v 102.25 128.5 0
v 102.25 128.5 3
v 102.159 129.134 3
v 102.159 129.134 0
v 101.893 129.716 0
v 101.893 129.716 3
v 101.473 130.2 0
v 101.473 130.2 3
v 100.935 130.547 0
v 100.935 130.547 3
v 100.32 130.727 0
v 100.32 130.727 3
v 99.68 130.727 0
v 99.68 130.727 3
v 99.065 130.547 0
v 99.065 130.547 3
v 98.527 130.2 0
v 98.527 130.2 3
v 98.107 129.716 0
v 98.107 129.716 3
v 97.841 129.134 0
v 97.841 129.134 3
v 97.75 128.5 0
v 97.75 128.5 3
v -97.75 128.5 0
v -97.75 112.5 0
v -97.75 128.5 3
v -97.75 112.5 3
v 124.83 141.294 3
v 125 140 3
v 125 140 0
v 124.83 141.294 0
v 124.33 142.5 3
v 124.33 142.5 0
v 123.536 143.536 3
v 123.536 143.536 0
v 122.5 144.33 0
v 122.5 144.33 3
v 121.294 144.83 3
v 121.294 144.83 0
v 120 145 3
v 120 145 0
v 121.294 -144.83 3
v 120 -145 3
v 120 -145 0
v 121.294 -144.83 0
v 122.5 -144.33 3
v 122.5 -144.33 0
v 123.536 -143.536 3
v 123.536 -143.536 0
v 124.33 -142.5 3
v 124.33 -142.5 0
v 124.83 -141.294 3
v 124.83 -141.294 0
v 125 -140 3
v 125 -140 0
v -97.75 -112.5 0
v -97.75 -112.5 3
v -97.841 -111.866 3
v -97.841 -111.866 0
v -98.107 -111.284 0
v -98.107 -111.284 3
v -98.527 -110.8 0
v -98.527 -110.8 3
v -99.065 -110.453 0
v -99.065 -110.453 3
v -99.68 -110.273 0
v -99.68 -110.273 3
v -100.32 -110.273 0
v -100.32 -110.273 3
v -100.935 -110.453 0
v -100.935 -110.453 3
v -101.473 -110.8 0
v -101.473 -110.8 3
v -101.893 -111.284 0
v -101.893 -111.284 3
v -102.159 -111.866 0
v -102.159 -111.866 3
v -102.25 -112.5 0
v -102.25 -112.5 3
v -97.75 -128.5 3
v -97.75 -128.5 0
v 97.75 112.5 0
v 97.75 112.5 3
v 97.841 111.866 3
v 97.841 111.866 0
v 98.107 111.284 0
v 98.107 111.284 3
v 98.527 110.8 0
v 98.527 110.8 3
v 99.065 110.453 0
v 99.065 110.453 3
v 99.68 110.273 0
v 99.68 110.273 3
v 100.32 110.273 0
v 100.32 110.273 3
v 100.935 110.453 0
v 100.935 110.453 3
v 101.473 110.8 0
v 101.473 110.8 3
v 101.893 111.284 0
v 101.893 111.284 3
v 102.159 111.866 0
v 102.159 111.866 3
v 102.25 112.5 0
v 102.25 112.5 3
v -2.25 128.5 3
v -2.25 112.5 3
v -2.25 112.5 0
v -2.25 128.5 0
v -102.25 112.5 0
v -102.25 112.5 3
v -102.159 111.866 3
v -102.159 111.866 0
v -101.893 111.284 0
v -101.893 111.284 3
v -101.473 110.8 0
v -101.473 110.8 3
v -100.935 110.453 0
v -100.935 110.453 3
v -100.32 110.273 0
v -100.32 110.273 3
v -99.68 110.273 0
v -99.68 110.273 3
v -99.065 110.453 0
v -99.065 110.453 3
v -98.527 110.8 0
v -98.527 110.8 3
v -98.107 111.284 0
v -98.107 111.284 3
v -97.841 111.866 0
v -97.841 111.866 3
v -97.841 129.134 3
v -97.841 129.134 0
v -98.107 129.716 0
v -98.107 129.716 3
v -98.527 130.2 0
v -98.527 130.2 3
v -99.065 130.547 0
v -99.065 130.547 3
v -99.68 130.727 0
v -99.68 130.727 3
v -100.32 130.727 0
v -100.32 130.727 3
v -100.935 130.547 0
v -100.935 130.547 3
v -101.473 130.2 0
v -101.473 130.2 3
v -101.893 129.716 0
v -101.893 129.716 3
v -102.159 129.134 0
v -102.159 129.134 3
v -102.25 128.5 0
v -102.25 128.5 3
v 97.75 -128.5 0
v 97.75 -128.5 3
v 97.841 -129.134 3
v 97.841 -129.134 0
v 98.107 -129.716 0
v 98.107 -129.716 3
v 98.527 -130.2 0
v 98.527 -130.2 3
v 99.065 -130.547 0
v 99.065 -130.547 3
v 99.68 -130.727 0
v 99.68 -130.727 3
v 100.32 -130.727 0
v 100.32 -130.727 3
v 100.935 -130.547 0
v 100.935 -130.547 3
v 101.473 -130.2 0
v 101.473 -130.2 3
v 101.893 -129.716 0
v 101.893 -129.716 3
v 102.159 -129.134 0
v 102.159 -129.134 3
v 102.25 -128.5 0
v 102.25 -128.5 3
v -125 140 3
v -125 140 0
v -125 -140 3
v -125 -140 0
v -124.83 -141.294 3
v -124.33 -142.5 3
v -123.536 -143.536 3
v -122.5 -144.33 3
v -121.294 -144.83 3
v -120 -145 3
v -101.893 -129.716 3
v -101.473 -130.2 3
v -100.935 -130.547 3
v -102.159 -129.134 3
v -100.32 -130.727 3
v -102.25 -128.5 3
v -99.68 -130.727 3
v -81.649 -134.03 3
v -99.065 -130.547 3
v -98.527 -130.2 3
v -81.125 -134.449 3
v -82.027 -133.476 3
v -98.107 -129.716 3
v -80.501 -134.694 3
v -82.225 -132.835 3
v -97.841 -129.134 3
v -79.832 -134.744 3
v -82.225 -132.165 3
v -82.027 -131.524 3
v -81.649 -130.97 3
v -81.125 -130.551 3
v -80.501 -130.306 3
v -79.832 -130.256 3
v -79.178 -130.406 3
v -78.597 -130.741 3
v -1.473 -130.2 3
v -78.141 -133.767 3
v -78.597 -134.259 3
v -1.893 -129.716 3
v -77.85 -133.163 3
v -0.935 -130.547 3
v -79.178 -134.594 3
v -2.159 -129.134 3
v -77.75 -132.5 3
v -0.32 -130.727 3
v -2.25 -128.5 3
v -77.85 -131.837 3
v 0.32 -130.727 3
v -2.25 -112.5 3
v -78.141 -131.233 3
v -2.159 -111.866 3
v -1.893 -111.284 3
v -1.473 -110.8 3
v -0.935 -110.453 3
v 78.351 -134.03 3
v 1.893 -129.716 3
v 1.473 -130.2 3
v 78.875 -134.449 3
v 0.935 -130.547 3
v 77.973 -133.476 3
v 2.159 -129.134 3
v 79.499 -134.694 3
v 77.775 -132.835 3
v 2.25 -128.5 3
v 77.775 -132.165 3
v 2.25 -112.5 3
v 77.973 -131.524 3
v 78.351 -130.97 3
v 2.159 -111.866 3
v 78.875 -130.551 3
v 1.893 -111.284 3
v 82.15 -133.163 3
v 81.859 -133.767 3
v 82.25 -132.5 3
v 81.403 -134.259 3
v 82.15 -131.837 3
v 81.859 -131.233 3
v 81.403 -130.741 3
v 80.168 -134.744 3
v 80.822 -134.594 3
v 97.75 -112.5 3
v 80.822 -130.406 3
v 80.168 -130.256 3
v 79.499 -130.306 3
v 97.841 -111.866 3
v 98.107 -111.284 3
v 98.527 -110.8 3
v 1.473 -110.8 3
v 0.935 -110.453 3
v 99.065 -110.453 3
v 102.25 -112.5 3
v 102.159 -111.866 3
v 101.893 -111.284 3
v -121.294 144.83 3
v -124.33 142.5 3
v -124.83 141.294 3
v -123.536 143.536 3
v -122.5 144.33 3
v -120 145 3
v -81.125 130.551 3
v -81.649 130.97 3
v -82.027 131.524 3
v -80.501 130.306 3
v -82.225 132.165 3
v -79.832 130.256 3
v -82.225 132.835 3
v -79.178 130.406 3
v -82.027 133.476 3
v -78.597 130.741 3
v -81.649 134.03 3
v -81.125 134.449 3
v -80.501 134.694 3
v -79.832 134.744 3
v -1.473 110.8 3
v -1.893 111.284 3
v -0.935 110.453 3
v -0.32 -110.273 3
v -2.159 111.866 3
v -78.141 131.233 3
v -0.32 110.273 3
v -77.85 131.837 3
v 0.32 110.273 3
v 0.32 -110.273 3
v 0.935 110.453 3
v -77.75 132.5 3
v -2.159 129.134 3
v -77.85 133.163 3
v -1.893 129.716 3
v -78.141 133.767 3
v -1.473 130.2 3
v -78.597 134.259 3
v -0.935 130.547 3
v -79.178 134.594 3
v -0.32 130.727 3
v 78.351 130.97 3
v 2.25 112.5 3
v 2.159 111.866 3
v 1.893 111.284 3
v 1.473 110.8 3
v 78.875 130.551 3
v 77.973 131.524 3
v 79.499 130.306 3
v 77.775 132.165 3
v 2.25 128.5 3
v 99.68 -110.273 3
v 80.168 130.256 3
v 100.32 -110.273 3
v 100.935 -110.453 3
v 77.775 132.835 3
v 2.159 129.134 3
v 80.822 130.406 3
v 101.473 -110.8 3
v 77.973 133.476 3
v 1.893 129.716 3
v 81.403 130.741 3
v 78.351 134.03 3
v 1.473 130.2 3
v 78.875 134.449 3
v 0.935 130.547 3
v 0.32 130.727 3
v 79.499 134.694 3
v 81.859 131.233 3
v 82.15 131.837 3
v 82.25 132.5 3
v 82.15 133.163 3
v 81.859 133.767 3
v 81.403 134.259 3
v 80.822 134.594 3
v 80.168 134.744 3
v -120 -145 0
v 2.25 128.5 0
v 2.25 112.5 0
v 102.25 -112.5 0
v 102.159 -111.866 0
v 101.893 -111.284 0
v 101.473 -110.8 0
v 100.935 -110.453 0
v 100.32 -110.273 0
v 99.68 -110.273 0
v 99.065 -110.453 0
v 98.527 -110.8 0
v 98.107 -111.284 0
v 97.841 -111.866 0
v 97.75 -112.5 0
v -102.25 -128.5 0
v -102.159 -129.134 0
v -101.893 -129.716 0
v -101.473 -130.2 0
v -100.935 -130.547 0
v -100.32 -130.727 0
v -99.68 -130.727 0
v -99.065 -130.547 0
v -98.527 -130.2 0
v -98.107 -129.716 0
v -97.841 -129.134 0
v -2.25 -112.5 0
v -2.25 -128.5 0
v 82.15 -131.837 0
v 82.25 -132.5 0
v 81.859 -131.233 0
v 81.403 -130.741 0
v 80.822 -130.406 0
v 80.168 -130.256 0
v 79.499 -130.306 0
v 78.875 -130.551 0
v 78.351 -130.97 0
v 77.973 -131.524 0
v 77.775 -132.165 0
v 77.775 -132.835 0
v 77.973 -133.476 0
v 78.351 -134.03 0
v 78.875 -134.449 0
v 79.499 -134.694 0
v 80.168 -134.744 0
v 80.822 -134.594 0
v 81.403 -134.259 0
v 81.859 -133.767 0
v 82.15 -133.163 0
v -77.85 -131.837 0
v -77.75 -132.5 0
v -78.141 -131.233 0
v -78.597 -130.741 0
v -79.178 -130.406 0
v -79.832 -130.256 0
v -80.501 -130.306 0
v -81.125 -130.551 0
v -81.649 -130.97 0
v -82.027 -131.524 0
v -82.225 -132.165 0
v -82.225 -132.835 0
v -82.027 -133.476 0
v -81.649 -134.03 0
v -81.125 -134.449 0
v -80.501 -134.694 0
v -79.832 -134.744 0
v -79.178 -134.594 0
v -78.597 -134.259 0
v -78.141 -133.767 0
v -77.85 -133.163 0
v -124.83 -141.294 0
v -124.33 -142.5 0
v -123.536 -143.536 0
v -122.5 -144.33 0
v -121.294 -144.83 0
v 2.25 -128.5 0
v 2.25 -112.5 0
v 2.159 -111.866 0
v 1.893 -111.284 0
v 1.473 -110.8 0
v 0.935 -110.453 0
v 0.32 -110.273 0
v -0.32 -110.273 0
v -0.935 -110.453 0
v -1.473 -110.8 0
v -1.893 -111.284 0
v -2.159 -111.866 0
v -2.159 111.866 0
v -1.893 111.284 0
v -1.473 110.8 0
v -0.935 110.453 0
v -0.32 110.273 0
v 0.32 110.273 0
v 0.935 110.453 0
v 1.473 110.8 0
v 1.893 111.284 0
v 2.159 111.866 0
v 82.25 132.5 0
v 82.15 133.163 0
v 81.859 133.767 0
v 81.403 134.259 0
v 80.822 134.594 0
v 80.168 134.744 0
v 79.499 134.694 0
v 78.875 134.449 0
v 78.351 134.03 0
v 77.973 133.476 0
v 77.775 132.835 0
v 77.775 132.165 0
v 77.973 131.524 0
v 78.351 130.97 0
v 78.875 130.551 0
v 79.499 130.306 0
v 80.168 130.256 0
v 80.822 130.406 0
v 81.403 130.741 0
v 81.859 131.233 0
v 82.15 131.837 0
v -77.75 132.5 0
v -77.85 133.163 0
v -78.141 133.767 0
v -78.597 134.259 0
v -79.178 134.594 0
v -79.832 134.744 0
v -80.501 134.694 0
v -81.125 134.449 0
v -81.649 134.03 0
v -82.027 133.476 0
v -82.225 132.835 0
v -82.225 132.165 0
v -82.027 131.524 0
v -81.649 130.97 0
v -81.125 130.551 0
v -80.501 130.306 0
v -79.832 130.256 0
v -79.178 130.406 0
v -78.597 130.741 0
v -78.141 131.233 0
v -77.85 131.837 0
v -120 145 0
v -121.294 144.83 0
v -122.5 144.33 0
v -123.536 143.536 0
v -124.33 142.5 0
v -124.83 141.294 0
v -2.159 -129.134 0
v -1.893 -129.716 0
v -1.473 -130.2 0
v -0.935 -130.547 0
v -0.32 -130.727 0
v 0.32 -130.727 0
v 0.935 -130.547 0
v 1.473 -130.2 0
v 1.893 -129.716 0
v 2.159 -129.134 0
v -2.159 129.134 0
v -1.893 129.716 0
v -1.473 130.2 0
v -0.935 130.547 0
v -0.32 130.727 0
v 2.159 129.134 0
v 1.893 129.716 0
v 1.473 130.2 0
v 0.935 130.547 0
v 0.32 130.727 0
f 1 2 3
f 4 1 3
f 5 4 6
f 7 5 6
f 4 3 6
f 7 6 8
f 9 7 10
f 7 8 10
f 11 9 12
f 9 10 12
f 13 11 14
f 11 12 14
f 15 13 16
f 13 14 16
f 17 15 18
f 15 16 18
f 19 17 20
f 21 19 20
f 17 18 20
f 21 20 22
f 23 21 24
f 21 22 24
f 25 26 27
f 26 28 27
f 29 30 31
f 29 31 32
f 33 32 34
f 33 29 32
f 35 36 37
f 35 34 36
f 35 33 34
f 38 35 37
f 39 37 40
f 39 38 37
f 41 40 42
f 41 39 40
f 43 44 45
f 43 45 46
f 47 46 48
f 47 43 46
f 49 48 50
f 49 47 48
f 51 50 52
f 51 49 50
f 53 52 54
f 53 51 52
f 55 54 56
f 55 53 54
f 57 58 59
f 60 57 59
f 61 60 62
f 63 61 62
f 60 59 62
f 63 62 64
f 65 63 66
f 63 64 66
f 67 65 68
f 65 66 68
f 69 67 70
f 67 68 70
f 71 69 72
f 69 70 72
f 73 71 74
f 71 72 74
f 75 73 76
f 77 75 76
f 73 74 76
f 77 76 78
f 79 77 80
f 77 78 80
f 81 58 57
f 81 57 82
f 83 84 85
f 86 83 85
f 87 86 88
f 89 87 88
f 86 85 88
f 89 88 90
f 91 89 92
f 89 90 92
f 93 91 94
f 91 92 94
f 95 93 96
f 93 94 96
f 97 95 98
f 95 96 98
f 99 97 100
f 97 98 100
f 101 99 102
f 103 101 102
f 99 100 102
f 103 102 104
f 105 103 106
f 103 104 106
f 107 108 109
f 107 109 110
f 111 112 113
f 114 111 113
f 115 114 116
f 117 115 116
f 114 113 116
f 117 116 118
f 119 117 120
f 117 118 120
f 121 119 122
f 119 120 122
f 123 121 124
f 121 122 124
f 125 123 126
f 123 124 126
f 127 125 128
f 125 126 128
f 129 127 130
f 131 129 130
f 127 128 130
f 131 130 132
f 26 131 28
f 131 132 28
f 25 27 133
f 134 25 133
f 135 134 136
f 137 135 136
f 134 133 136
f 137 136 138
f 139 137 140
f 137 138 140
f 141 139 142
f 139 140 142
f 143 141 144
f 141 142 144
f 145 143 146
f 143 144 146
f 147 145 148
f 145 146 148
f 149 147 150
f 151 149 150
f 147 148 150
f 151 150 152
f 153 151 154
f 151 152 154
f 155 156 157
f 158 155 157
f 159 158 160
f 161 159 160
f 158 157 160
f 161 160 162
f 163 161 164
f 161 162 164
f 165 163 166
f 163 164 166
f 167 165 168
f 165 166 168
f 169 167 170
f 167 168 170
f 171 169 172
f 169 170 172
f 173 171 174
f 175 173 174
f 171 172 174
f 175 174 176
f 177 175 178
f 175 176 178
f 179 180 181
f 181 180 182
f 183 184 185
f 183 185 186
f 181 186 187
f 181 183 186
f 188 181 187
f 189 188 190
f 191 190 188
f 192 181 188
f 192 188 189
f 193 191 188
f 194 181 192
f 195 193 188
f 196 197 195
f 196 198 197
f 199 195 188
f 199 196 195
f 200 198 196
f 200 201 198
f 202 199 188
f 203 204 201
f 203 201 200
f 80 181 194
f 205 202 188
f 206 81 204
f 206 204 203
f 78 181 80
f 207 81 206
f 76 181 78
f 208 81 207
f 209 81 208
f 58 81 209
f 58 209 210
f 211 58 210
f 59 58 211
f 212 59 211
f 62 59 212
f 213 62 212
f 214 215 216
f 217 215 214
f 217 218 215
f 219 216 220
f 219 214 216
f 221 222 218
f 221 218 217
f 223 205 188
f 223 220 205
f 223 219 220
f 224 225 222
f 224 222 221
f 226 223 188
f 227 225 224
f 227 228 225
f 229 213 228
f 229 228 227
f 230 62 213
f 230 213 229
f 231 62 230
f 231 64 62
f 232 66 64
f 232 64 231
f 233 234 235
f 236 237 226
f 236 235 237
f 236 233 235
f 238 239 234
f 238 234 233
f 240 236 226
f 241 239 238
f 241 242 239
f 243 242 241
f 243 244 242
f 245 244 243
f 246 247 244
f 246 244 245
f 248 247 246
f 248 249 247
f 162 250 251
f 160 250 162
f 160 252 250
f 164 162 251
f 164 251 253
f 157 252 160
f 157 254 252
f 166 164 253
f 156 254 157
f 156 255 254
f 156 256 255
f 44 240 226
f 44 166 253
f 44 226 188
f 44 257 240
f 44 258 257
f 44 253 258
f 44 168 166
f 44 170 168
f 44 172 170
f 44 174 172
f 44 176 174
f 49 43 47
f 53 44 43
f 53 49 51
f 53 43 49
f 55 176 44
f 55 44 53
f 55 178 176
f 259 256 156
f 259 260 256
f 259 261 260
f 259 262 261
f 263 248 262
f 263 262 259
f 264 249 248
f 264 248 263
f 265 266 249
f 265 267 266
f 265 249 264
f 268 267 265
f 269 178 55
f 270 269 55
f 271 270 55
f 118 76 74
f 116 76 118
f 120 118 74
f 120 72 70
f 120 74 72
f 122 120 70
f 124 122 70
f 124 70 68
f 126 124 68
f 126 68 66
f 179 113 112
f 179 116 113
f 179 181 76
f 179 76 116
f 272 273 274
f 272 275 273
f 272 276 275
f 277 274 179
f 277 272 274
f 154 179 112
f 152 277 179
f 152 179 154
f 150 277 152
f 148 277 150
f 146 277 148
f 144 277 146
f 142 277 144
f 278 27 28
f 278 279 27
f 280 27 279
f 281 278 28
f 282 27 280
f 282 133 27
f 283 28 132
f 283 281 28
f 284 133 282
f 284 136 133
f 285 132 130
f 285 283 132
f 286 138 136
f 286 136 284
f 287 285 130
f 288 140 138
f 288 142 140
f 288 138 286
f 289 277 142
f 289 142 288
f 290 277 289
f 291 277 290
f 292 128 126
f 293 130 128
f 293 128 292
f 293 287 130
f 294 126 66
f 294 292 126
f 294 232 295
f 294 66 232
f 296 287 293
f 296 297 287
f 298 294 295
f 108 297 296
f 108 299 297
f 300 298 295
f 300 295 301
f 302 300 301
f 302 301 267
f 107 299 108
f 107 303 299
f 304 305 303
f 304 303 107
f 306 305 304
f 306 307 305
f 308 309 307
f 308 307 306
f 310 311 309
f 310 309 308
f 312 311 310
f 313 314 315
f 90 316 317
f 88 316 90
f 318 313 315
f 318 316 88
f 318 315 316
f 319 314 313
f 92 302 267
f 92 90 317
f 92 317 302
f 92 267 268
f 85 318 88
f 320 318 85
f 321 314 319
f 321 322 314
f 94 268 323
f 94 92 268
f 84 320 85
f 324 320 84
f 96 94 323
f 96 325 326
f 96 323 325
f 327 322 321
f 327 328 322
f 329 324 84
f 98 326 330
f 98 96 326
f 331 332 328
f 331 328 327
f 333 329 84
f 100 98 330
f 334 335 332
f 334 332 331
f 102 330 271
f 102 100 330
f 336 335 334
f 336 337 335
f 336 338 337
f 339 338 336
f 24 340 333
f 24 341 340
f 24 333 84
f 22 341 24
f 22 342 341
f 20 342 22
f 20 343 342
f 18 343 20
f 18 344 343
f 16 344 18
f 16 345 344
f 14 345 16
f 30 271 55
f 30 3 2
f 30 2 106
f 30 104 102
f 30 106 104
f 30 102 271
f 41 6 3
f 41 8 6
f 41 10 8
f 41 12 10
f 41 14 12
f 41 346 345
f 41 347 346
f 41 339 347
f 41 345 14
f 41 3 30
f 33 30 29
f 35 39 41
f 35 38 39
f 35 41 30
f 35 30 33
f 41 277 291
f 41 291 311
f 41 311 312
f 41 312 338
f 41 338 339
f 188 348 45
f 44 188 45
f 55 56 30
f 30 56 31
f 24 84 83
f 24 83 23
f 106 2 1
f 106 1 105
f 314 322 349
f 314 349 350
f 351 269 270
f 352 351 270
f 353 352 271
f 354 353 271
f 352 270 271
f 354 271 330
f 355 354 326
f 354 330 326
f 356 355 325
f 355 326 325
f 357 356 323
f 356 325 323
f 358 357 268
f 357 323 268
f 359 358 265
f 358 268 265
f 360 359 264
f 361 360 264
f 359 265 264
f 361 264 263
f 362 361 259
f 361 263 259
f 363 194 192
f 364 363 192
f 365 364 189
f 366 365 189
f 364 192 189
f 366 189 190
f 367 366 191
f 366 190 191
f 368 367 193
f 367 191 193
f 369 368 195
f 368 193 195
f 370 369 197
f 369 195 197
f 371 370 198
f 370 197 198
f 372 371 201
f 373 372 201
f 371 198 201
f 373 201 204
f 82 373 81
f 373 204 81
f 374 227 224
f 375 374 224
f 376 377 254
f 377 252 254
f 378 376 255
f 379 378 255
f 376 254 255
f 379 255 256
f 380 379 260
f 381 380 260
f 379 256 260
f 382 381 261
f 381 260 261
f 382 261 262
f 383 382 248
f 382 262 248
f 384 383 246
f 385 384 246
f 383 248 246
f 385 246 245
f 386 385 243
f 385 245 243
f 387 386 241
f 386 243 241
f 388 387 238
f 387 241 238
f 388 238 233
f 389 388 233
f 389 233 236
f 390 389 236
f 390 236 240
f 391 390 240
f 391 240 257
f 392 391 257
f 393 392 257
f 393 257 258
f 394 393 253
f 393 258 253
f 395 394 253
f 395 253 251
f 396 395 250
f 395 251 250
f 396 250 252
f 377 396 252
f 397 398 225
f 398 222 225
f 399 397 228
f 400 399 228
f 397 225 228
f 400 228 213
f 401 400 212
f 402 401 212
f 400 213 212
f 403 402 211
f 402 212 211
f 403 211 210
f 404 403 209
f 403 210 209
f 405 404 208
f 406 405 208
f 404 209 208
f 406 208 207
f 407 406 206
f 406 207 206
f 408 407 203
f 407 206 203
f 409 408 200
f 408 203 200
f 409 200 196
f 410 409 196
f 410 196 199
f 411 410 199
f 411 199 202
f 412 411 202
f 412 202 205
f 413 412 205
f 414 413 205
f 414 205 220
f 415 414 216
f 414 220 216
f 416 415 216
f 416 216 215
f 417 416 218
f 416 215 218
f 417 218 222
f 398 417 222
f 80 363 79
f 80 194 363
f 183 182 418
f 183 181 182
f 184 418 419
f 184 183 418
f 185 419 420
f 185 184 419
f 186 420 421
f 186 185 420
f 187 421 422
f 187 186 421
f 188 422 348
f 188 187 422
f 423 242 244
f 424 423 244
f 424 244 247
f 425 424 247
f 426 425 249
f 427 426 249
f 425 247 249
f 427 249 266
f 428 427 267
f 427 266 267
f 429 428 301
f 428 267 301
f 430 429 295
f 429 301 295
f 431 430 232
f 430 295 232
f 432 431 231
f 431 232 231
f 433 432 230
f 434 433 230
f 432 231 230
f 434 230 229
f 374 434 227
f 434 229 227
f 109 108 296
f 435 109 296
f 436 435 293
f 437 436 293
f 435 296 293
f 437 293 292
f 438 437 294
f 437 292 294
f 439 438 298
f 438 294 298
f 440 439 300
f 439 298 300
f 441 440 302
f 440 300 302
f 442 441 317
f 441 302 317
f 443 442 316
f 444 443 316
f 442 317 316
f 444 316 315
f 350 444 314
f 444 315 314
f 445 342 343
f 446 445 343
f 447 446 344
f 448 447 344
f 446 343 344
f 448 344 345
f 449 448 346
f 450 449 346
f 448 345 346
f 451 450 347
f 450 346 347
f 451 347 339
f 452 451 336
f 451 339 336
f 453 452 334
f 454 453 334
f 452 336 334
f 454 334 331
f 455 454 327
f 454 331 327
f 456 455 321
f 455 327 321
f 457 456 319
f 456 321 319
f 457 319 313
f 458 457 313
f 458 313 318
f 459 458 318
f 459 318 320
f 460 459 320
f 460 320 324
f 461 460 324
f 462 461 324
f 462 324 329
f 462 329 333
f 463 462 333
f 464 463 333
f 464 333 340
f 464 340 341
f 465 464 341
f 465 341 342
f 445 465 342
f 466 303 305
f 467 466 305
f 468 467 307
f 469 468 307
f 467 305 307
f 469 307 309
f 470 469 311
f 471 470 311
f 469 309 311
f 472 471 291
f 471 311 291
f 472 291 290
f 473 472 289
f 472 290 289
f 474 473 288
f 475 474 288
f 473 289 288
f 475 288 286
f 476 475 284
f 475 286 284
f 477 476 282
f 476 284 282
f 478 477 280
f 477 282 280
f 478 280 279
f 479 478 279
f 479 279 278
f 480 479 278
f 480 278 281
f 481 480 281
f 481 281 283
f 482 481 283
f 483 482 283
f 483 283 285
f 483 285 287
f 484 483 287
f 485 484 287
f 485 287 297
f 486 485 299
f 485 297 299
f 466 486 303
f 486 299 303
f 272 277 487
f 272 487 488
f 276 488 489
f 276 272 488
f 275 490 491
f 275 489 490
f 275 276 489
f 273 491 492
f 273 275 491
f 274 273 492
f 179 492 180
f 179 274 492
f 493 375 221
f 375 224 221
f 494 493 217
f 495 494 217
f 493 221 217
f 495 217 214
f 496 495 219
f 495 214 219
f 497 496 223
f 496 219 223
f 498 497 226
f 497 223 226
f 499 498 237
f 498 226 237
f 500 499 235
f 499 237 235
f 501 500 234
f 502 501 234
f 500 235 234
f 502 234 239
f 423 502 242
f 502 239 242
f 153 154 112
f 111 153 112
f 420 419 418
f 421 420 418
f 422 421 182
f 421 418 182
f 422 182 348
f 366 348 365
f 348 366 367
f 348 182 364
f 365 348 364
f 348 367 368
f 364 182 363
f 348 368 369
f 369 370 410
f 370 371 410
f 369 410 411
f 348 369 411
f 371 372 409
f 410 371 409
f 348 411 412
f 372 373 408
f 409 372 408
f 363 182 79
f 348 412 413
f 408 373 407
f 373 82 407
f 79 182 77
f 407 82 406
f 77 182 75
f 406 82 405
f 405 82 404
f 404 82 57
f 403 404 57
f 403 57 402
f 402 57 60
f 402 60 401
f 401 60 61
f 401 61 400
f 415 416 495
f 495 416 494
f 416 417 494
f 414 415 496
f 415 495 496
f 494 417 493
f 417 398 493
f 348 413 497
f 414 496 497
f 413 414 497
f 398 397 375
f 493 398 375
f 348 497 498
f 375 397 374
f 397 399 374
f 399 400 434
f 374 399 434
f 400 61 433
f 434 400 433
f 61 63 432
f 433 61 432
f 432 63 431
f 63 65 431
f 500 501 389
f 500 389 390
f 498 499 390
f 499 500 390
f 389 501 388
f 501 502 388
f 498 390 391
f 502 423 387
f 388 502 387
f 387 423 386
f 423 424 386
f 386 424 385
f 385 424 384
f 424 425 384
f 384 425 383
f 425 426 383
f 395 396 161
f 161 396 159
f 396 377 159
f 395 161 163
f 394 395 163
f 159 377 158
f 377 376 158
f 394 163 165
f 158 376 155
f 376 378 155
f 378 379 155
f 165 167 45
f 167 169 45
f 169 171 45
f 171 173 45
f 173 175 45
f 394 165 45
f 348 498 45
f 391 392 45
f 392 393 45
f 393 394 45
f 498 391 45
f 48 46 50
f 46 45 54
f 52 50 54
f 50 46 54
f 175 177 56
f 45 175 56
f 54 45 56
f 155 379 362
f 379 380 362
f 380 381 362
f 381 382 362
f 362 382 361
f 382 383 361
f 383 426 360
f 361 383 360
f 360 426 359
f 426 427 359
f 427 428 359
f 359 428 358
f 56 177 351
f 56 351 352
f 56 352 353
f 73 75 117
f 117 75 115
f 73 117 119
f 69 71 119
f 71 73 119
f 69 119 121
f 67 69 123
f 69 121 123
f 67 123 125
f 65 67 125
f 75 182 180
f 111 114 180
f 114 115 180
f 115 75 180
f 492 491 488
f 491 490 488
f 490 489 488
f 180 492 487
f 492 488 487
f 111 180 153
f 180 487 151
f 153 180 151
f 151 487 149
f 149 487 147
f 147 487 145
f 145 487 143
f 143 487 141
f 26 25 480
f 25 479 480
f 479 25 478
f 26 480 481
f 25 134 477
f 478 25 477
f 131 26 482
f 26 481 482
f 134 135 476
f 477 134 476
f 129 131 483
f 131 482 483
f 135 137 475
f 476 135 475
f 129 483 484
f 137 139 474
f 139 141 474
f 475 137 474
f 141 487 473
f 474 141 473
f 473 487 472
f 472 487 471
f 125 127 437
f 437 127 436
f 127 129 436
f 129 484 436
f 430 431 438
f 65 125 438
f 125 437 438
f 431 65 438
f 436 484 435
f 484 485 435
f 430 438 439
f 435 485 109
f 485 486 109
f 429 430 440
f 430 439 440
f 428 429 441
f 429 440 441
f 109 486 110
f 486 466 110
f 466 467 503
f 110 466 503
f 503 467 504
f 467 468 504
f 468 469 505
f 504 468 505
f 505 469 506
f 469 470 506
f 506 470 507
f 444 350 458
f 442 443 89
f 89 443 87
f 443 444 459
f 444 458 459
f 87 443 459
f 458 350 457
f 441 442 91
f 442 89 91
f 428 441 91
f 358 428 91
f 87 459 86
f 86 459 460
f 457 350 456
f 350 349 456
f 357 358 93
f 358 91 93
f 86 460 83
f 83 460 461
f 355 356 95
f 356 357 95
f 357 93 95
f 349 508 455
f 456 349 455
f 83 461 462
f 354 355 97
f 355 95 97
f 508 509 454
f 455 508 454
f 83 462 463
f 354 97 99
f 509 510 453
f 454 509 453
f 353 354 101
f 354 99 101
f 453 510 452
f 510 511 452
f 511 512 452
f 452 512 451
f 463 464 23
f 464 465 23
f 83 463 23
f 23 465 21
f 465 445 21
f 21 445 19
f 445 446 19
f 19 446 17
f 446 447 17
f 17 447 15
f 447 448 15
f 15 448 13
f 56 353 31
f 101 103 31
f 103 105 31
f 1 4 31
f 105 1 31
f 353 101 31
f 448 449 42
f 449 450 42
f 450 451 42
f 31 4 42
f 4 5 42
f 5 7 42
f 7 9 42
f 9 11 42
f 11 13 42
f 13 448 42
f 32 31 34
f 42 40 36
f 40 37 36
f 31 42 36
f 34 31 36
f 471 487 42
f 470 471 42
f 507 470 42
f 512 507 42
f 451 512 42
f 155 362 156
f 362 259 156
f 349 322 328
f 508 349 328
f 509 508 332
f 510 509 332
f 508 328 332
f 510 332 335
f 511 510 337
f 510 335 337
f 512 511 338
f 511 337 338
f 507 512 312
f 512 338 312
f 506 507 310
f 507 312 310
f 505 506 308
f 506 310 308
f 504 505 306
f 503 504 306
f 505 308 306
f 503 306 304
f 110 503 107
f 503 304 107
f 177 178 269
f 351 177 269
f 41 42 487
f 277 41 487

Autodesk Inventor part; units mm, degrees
ref_plane "YZ Plane" through (0, 0, 0) normal (1, 0, 0) x (0, 1, 0)
ref_plane "XZ Plane" through (0, 0, 0) normal (0, 1, 0) x (-1, 0, 0)
ref_plane "XY Plane" through (0, 0, 0) normal (0, 0, 1) x (1, 0, 0)
sketch "Sketch1" plane through (0, 0, 0) normal (0, 0, 1) x (1, 0, 0)
  line L0 (-125, -145) -> (125, -145)
  line L1 (125, -145) -> (125, 145)
  line L2 (125, 145) -> (-125, 145)
  line L3 (-125, 145) -> (-125, -145)
  line L4 (-125, -145) -> (125, 145) construction
  line L5 (125, -145) -> (-125, 145) construction
  point P0 (0, 0)
  dimension "d0" = 250
  dimension "d1" = 290
extrude "Extrusion1" add sketch "Sketch1" along normal blind 3
sketch "Sketch3" plane through (0, 0, 3) normal (0, 0, 1) x (1, 0, 0)
  line L0 (-137.8811, -120.5) -> (156, -120.5) construction
  line L1 (-196.6573, 0) -> (214.7762, 0) construction
  line L2 (-137.8811, 120.5) -> (156, 120.5) construction
  line L3 (-100, -128.5) -> (-100, -112.5) construction
  line L4 (-102.25, -128.5) -> (-102.25, -112.5)
  line L5 (-97.75, -112.5) -> (-97.75, -128.5)
  arc A0 (-102.25, -128.5) -> (-97.75, -128.5) centre (-100, -128.5) ccw
  arc A1 (-97.75, -112.5) -> (-102.25, -112.5) centre (-100, -112.5) ccw
  line L6 (0, -128.5) -> (0, -112.5) construction
  line L7 (2.25, -128.5) -> (2.25, -112.5)
  line L8 (-2.25, -112.5) -> (-2.25, -128.5)
  arc A2 (-2.25, -128.5) -> (2.25, -128.5) centre (0, -128.5) ccw
  arc A3 (2.25, -112.5) -> (-2.25, -112.5) centre (0, -112.5) ccw
  line L9 (0, 203) -> (0, -203) construction
  line L10 (100, -128.5) -> (100, -112.5) construction
  line L11 (102.25, -128.5) -> (102.25, -112.5)
  line L12 (97.75, -112.5) -> (97.75, -128.5)
  arc A4 (97.75, -128.5) -> (102.25, -128.5) centre (100, -128.5) ccw
  arc A5 (102.25, -112.5) -> (97.75, -112.5) centre (100, -112.5) ccw
  line L13 (-100, 128.5) -> (-100, 112.5) construction
  line L14 (-102.25, 128.5) -> (-102.25, 112.5)
  line L15 (-97.75, 112.5) -> (-97.75, 128.5)
  arc A6 (-97.75, 128.5) -> (-102.25, 128.5) centre (-100, 128.5) ccw
  arc A7 (-102.25, 112.5) -> (-97.75, 112.5) centre (-100, 112.5) ccw
  line L16 (0, 128.5) -> (0, 112.5) construction
  line L17 (2.25, 128.5) -> (2.25, 112.5)
  line L18 (-2.25, 112.5) -> (-2.25, 128.5)
  arc A8 (2.25, 128.5) -> (-2.25, 128.5) centre (0, 128.5) ccw
  arc A9 (-2.25, 112.5) -> (2.25, 112.5) centre (0, 112.5) ccw
  arc A10 (97.75, 112.5) -> (102.25, 112.5) centre (100, 112.5) ccw
  line L19 (100, 128.5) -> (100, 112.5) construction
  line L20 (102.25, 128.5) -> (102.25, 112.5)
  line L21 (97.75, 112.5) -> (97.75, 128.5)
  arc A11 (102.25, 128.5) -> (97.75, 128.5) centre (100, 128.5) ccw
  circle A12 centre (-80, -132.5) radius 2.25
  line L22 (-125, -145) -> (125, -145) projected
  circle A13 centre (80, -132.5) radius 2.25
  circle A14 centre (-80, 132.5) radius 2.25
  circle A15 centre (80, 132.5) radius 2.25
  point P0 (0, 0)
  point P1 (-100, -120.5)
  point P2 (0, -120.5)
  point P3 (100, -120.5)
  point P4 (-100, 120.5)
  point P5 (0, 120.5)
  point P6 (100, 120.5)
  dimension "d5" = 16
  dimension "d6" = 16
  dimension "d7" = 2.25
  dimension "d8" = 2.25
  dimension "d9" = 100
  dimension "d10" = 120.5
  dimension "d16" = 80
  dimension "d17" = 12.5
  dimension "d18" = 4.5
extrude "Extrusion2" cut sketch "Sketch3" against normal through all
fillet "Fillet1" radius 5 4 edges at (-125, 145, 1.5) (125, 145, 1.5) (125, -145, 1.5) (-125, -145, 1.5)
sketch "Sketch4" plane through (0, 0, 3) normal (0, 0, 1) x (1, 0, 0)
  arc A0 (-125, -140) -> (-120, -145) centre (-120, -140) ccw projected
  line L0 (-120, -145) -> (120, -145) projected
  arc A1 (120, -145) -> (125, -140) centre (120, -140) ccw projected
  line L1 (125, -140) -> (125, 140) projected
  arc A2 (125, 140) -> (120, 145) centre (120, 140) ccw projected
  line L2 (120, 145) -> (-120, 145) projected
  arc A3 (-120, 145) -> (-125, 140) centre (-120, 140) ccw projected
  line L3 (-125, 140) -> (-125, -140) projected
  circle A4 centre (80, -132.5) radius 2.25 projected
  arc A5 (2.25, 128.5) -> (-2.25, 128.5) centre (0, 128.5) ccw projected
  line L4 (2.25, 128.5) -> (2.25, 112.5) projected
  arc A6 (-2.25, 112.5) -> (2.25, 112.5) centre (0, 112.5) ccw projected
  line L5 (-2.25, 112.5) -> (-2.25, 128.5) projected
  arc A7 (97.75, -128.5) -> (102.25, -128.5) centre (100, -128.5) ccw projected
  line L6 (97.75, -128.5) -> (97.75, -112.5) projected
  arc A8 (102.25, -112.5) -> (97.75, -112.5) centre (100, -112.5) ccw projected
  line L7 (102.25, -112.5) -> (102.25, -128.5) projected
  line L8 (-102.25, 112.5) -> (-102.25, 128.5) projected
  arc A9 (-97.75, 128.5) -> (-102.25, 128.5) centre (-100, 128.5) ccw projected
  line L9 (-97.75, 128.5) -> (-97.75, 112.5) projected
  arc A10 (-102.25, 112.5) -> (-97.75, 112.5) centre (-100, 112.5) ccw projected
  circle A11 centre (80, 132.5) radius 2.25 projected
  circle A12 centre (-80, -132.5) radius 2.25 projected
  arc A13 (-102.25, -128.5) -> (-97.75, -128.5) centre (-100, -128.5) ccw projected
  line L10 (-102.25, -128.5) -> (-102.25, -112.5) projected
  arc A14 (-97.75, -112.5) -> (-102.25, -112.5) centre (-100, -112.5) ccw projected
  line L11 (-97.75, -112.5) -> (-97.75, -128.5) projected
  line L12 (-2.25, -128.5) -> (-2.25, -112.5) projected
  arc A15 (2.25, -112.5) -> (-2.25, -112.5) centre (0, -112.5) ccw projected
  line L13 (2.25, -112.5) -> (2.25, -128.5) projected
  arc A16 (-2.25, -128.5) -> (2.25, -128.5) centre (0, -128.5) ccw projected
  arc A17 (97.75, 112.5) -> (102.25, 112.5) centre (100, 112.5) ccw projected
  line L14 (97.75, 112.5) -> (97.75, 128.5) projected
  arc A18 (102.25, 128.5) -> (97.75, 128.5) centre (100, 128.5) ccw projected
  line L15 (102.25, 128.5) -> (102.25, 112.5) projected
  circle A19 centre (-80, 132.5) radius 2.25 projected
  point P0 (0, 0)
equation "\"d6\" = d5"
equation "\"d8\" = d7"
properties part number "DisplayAcrylicPlate"
